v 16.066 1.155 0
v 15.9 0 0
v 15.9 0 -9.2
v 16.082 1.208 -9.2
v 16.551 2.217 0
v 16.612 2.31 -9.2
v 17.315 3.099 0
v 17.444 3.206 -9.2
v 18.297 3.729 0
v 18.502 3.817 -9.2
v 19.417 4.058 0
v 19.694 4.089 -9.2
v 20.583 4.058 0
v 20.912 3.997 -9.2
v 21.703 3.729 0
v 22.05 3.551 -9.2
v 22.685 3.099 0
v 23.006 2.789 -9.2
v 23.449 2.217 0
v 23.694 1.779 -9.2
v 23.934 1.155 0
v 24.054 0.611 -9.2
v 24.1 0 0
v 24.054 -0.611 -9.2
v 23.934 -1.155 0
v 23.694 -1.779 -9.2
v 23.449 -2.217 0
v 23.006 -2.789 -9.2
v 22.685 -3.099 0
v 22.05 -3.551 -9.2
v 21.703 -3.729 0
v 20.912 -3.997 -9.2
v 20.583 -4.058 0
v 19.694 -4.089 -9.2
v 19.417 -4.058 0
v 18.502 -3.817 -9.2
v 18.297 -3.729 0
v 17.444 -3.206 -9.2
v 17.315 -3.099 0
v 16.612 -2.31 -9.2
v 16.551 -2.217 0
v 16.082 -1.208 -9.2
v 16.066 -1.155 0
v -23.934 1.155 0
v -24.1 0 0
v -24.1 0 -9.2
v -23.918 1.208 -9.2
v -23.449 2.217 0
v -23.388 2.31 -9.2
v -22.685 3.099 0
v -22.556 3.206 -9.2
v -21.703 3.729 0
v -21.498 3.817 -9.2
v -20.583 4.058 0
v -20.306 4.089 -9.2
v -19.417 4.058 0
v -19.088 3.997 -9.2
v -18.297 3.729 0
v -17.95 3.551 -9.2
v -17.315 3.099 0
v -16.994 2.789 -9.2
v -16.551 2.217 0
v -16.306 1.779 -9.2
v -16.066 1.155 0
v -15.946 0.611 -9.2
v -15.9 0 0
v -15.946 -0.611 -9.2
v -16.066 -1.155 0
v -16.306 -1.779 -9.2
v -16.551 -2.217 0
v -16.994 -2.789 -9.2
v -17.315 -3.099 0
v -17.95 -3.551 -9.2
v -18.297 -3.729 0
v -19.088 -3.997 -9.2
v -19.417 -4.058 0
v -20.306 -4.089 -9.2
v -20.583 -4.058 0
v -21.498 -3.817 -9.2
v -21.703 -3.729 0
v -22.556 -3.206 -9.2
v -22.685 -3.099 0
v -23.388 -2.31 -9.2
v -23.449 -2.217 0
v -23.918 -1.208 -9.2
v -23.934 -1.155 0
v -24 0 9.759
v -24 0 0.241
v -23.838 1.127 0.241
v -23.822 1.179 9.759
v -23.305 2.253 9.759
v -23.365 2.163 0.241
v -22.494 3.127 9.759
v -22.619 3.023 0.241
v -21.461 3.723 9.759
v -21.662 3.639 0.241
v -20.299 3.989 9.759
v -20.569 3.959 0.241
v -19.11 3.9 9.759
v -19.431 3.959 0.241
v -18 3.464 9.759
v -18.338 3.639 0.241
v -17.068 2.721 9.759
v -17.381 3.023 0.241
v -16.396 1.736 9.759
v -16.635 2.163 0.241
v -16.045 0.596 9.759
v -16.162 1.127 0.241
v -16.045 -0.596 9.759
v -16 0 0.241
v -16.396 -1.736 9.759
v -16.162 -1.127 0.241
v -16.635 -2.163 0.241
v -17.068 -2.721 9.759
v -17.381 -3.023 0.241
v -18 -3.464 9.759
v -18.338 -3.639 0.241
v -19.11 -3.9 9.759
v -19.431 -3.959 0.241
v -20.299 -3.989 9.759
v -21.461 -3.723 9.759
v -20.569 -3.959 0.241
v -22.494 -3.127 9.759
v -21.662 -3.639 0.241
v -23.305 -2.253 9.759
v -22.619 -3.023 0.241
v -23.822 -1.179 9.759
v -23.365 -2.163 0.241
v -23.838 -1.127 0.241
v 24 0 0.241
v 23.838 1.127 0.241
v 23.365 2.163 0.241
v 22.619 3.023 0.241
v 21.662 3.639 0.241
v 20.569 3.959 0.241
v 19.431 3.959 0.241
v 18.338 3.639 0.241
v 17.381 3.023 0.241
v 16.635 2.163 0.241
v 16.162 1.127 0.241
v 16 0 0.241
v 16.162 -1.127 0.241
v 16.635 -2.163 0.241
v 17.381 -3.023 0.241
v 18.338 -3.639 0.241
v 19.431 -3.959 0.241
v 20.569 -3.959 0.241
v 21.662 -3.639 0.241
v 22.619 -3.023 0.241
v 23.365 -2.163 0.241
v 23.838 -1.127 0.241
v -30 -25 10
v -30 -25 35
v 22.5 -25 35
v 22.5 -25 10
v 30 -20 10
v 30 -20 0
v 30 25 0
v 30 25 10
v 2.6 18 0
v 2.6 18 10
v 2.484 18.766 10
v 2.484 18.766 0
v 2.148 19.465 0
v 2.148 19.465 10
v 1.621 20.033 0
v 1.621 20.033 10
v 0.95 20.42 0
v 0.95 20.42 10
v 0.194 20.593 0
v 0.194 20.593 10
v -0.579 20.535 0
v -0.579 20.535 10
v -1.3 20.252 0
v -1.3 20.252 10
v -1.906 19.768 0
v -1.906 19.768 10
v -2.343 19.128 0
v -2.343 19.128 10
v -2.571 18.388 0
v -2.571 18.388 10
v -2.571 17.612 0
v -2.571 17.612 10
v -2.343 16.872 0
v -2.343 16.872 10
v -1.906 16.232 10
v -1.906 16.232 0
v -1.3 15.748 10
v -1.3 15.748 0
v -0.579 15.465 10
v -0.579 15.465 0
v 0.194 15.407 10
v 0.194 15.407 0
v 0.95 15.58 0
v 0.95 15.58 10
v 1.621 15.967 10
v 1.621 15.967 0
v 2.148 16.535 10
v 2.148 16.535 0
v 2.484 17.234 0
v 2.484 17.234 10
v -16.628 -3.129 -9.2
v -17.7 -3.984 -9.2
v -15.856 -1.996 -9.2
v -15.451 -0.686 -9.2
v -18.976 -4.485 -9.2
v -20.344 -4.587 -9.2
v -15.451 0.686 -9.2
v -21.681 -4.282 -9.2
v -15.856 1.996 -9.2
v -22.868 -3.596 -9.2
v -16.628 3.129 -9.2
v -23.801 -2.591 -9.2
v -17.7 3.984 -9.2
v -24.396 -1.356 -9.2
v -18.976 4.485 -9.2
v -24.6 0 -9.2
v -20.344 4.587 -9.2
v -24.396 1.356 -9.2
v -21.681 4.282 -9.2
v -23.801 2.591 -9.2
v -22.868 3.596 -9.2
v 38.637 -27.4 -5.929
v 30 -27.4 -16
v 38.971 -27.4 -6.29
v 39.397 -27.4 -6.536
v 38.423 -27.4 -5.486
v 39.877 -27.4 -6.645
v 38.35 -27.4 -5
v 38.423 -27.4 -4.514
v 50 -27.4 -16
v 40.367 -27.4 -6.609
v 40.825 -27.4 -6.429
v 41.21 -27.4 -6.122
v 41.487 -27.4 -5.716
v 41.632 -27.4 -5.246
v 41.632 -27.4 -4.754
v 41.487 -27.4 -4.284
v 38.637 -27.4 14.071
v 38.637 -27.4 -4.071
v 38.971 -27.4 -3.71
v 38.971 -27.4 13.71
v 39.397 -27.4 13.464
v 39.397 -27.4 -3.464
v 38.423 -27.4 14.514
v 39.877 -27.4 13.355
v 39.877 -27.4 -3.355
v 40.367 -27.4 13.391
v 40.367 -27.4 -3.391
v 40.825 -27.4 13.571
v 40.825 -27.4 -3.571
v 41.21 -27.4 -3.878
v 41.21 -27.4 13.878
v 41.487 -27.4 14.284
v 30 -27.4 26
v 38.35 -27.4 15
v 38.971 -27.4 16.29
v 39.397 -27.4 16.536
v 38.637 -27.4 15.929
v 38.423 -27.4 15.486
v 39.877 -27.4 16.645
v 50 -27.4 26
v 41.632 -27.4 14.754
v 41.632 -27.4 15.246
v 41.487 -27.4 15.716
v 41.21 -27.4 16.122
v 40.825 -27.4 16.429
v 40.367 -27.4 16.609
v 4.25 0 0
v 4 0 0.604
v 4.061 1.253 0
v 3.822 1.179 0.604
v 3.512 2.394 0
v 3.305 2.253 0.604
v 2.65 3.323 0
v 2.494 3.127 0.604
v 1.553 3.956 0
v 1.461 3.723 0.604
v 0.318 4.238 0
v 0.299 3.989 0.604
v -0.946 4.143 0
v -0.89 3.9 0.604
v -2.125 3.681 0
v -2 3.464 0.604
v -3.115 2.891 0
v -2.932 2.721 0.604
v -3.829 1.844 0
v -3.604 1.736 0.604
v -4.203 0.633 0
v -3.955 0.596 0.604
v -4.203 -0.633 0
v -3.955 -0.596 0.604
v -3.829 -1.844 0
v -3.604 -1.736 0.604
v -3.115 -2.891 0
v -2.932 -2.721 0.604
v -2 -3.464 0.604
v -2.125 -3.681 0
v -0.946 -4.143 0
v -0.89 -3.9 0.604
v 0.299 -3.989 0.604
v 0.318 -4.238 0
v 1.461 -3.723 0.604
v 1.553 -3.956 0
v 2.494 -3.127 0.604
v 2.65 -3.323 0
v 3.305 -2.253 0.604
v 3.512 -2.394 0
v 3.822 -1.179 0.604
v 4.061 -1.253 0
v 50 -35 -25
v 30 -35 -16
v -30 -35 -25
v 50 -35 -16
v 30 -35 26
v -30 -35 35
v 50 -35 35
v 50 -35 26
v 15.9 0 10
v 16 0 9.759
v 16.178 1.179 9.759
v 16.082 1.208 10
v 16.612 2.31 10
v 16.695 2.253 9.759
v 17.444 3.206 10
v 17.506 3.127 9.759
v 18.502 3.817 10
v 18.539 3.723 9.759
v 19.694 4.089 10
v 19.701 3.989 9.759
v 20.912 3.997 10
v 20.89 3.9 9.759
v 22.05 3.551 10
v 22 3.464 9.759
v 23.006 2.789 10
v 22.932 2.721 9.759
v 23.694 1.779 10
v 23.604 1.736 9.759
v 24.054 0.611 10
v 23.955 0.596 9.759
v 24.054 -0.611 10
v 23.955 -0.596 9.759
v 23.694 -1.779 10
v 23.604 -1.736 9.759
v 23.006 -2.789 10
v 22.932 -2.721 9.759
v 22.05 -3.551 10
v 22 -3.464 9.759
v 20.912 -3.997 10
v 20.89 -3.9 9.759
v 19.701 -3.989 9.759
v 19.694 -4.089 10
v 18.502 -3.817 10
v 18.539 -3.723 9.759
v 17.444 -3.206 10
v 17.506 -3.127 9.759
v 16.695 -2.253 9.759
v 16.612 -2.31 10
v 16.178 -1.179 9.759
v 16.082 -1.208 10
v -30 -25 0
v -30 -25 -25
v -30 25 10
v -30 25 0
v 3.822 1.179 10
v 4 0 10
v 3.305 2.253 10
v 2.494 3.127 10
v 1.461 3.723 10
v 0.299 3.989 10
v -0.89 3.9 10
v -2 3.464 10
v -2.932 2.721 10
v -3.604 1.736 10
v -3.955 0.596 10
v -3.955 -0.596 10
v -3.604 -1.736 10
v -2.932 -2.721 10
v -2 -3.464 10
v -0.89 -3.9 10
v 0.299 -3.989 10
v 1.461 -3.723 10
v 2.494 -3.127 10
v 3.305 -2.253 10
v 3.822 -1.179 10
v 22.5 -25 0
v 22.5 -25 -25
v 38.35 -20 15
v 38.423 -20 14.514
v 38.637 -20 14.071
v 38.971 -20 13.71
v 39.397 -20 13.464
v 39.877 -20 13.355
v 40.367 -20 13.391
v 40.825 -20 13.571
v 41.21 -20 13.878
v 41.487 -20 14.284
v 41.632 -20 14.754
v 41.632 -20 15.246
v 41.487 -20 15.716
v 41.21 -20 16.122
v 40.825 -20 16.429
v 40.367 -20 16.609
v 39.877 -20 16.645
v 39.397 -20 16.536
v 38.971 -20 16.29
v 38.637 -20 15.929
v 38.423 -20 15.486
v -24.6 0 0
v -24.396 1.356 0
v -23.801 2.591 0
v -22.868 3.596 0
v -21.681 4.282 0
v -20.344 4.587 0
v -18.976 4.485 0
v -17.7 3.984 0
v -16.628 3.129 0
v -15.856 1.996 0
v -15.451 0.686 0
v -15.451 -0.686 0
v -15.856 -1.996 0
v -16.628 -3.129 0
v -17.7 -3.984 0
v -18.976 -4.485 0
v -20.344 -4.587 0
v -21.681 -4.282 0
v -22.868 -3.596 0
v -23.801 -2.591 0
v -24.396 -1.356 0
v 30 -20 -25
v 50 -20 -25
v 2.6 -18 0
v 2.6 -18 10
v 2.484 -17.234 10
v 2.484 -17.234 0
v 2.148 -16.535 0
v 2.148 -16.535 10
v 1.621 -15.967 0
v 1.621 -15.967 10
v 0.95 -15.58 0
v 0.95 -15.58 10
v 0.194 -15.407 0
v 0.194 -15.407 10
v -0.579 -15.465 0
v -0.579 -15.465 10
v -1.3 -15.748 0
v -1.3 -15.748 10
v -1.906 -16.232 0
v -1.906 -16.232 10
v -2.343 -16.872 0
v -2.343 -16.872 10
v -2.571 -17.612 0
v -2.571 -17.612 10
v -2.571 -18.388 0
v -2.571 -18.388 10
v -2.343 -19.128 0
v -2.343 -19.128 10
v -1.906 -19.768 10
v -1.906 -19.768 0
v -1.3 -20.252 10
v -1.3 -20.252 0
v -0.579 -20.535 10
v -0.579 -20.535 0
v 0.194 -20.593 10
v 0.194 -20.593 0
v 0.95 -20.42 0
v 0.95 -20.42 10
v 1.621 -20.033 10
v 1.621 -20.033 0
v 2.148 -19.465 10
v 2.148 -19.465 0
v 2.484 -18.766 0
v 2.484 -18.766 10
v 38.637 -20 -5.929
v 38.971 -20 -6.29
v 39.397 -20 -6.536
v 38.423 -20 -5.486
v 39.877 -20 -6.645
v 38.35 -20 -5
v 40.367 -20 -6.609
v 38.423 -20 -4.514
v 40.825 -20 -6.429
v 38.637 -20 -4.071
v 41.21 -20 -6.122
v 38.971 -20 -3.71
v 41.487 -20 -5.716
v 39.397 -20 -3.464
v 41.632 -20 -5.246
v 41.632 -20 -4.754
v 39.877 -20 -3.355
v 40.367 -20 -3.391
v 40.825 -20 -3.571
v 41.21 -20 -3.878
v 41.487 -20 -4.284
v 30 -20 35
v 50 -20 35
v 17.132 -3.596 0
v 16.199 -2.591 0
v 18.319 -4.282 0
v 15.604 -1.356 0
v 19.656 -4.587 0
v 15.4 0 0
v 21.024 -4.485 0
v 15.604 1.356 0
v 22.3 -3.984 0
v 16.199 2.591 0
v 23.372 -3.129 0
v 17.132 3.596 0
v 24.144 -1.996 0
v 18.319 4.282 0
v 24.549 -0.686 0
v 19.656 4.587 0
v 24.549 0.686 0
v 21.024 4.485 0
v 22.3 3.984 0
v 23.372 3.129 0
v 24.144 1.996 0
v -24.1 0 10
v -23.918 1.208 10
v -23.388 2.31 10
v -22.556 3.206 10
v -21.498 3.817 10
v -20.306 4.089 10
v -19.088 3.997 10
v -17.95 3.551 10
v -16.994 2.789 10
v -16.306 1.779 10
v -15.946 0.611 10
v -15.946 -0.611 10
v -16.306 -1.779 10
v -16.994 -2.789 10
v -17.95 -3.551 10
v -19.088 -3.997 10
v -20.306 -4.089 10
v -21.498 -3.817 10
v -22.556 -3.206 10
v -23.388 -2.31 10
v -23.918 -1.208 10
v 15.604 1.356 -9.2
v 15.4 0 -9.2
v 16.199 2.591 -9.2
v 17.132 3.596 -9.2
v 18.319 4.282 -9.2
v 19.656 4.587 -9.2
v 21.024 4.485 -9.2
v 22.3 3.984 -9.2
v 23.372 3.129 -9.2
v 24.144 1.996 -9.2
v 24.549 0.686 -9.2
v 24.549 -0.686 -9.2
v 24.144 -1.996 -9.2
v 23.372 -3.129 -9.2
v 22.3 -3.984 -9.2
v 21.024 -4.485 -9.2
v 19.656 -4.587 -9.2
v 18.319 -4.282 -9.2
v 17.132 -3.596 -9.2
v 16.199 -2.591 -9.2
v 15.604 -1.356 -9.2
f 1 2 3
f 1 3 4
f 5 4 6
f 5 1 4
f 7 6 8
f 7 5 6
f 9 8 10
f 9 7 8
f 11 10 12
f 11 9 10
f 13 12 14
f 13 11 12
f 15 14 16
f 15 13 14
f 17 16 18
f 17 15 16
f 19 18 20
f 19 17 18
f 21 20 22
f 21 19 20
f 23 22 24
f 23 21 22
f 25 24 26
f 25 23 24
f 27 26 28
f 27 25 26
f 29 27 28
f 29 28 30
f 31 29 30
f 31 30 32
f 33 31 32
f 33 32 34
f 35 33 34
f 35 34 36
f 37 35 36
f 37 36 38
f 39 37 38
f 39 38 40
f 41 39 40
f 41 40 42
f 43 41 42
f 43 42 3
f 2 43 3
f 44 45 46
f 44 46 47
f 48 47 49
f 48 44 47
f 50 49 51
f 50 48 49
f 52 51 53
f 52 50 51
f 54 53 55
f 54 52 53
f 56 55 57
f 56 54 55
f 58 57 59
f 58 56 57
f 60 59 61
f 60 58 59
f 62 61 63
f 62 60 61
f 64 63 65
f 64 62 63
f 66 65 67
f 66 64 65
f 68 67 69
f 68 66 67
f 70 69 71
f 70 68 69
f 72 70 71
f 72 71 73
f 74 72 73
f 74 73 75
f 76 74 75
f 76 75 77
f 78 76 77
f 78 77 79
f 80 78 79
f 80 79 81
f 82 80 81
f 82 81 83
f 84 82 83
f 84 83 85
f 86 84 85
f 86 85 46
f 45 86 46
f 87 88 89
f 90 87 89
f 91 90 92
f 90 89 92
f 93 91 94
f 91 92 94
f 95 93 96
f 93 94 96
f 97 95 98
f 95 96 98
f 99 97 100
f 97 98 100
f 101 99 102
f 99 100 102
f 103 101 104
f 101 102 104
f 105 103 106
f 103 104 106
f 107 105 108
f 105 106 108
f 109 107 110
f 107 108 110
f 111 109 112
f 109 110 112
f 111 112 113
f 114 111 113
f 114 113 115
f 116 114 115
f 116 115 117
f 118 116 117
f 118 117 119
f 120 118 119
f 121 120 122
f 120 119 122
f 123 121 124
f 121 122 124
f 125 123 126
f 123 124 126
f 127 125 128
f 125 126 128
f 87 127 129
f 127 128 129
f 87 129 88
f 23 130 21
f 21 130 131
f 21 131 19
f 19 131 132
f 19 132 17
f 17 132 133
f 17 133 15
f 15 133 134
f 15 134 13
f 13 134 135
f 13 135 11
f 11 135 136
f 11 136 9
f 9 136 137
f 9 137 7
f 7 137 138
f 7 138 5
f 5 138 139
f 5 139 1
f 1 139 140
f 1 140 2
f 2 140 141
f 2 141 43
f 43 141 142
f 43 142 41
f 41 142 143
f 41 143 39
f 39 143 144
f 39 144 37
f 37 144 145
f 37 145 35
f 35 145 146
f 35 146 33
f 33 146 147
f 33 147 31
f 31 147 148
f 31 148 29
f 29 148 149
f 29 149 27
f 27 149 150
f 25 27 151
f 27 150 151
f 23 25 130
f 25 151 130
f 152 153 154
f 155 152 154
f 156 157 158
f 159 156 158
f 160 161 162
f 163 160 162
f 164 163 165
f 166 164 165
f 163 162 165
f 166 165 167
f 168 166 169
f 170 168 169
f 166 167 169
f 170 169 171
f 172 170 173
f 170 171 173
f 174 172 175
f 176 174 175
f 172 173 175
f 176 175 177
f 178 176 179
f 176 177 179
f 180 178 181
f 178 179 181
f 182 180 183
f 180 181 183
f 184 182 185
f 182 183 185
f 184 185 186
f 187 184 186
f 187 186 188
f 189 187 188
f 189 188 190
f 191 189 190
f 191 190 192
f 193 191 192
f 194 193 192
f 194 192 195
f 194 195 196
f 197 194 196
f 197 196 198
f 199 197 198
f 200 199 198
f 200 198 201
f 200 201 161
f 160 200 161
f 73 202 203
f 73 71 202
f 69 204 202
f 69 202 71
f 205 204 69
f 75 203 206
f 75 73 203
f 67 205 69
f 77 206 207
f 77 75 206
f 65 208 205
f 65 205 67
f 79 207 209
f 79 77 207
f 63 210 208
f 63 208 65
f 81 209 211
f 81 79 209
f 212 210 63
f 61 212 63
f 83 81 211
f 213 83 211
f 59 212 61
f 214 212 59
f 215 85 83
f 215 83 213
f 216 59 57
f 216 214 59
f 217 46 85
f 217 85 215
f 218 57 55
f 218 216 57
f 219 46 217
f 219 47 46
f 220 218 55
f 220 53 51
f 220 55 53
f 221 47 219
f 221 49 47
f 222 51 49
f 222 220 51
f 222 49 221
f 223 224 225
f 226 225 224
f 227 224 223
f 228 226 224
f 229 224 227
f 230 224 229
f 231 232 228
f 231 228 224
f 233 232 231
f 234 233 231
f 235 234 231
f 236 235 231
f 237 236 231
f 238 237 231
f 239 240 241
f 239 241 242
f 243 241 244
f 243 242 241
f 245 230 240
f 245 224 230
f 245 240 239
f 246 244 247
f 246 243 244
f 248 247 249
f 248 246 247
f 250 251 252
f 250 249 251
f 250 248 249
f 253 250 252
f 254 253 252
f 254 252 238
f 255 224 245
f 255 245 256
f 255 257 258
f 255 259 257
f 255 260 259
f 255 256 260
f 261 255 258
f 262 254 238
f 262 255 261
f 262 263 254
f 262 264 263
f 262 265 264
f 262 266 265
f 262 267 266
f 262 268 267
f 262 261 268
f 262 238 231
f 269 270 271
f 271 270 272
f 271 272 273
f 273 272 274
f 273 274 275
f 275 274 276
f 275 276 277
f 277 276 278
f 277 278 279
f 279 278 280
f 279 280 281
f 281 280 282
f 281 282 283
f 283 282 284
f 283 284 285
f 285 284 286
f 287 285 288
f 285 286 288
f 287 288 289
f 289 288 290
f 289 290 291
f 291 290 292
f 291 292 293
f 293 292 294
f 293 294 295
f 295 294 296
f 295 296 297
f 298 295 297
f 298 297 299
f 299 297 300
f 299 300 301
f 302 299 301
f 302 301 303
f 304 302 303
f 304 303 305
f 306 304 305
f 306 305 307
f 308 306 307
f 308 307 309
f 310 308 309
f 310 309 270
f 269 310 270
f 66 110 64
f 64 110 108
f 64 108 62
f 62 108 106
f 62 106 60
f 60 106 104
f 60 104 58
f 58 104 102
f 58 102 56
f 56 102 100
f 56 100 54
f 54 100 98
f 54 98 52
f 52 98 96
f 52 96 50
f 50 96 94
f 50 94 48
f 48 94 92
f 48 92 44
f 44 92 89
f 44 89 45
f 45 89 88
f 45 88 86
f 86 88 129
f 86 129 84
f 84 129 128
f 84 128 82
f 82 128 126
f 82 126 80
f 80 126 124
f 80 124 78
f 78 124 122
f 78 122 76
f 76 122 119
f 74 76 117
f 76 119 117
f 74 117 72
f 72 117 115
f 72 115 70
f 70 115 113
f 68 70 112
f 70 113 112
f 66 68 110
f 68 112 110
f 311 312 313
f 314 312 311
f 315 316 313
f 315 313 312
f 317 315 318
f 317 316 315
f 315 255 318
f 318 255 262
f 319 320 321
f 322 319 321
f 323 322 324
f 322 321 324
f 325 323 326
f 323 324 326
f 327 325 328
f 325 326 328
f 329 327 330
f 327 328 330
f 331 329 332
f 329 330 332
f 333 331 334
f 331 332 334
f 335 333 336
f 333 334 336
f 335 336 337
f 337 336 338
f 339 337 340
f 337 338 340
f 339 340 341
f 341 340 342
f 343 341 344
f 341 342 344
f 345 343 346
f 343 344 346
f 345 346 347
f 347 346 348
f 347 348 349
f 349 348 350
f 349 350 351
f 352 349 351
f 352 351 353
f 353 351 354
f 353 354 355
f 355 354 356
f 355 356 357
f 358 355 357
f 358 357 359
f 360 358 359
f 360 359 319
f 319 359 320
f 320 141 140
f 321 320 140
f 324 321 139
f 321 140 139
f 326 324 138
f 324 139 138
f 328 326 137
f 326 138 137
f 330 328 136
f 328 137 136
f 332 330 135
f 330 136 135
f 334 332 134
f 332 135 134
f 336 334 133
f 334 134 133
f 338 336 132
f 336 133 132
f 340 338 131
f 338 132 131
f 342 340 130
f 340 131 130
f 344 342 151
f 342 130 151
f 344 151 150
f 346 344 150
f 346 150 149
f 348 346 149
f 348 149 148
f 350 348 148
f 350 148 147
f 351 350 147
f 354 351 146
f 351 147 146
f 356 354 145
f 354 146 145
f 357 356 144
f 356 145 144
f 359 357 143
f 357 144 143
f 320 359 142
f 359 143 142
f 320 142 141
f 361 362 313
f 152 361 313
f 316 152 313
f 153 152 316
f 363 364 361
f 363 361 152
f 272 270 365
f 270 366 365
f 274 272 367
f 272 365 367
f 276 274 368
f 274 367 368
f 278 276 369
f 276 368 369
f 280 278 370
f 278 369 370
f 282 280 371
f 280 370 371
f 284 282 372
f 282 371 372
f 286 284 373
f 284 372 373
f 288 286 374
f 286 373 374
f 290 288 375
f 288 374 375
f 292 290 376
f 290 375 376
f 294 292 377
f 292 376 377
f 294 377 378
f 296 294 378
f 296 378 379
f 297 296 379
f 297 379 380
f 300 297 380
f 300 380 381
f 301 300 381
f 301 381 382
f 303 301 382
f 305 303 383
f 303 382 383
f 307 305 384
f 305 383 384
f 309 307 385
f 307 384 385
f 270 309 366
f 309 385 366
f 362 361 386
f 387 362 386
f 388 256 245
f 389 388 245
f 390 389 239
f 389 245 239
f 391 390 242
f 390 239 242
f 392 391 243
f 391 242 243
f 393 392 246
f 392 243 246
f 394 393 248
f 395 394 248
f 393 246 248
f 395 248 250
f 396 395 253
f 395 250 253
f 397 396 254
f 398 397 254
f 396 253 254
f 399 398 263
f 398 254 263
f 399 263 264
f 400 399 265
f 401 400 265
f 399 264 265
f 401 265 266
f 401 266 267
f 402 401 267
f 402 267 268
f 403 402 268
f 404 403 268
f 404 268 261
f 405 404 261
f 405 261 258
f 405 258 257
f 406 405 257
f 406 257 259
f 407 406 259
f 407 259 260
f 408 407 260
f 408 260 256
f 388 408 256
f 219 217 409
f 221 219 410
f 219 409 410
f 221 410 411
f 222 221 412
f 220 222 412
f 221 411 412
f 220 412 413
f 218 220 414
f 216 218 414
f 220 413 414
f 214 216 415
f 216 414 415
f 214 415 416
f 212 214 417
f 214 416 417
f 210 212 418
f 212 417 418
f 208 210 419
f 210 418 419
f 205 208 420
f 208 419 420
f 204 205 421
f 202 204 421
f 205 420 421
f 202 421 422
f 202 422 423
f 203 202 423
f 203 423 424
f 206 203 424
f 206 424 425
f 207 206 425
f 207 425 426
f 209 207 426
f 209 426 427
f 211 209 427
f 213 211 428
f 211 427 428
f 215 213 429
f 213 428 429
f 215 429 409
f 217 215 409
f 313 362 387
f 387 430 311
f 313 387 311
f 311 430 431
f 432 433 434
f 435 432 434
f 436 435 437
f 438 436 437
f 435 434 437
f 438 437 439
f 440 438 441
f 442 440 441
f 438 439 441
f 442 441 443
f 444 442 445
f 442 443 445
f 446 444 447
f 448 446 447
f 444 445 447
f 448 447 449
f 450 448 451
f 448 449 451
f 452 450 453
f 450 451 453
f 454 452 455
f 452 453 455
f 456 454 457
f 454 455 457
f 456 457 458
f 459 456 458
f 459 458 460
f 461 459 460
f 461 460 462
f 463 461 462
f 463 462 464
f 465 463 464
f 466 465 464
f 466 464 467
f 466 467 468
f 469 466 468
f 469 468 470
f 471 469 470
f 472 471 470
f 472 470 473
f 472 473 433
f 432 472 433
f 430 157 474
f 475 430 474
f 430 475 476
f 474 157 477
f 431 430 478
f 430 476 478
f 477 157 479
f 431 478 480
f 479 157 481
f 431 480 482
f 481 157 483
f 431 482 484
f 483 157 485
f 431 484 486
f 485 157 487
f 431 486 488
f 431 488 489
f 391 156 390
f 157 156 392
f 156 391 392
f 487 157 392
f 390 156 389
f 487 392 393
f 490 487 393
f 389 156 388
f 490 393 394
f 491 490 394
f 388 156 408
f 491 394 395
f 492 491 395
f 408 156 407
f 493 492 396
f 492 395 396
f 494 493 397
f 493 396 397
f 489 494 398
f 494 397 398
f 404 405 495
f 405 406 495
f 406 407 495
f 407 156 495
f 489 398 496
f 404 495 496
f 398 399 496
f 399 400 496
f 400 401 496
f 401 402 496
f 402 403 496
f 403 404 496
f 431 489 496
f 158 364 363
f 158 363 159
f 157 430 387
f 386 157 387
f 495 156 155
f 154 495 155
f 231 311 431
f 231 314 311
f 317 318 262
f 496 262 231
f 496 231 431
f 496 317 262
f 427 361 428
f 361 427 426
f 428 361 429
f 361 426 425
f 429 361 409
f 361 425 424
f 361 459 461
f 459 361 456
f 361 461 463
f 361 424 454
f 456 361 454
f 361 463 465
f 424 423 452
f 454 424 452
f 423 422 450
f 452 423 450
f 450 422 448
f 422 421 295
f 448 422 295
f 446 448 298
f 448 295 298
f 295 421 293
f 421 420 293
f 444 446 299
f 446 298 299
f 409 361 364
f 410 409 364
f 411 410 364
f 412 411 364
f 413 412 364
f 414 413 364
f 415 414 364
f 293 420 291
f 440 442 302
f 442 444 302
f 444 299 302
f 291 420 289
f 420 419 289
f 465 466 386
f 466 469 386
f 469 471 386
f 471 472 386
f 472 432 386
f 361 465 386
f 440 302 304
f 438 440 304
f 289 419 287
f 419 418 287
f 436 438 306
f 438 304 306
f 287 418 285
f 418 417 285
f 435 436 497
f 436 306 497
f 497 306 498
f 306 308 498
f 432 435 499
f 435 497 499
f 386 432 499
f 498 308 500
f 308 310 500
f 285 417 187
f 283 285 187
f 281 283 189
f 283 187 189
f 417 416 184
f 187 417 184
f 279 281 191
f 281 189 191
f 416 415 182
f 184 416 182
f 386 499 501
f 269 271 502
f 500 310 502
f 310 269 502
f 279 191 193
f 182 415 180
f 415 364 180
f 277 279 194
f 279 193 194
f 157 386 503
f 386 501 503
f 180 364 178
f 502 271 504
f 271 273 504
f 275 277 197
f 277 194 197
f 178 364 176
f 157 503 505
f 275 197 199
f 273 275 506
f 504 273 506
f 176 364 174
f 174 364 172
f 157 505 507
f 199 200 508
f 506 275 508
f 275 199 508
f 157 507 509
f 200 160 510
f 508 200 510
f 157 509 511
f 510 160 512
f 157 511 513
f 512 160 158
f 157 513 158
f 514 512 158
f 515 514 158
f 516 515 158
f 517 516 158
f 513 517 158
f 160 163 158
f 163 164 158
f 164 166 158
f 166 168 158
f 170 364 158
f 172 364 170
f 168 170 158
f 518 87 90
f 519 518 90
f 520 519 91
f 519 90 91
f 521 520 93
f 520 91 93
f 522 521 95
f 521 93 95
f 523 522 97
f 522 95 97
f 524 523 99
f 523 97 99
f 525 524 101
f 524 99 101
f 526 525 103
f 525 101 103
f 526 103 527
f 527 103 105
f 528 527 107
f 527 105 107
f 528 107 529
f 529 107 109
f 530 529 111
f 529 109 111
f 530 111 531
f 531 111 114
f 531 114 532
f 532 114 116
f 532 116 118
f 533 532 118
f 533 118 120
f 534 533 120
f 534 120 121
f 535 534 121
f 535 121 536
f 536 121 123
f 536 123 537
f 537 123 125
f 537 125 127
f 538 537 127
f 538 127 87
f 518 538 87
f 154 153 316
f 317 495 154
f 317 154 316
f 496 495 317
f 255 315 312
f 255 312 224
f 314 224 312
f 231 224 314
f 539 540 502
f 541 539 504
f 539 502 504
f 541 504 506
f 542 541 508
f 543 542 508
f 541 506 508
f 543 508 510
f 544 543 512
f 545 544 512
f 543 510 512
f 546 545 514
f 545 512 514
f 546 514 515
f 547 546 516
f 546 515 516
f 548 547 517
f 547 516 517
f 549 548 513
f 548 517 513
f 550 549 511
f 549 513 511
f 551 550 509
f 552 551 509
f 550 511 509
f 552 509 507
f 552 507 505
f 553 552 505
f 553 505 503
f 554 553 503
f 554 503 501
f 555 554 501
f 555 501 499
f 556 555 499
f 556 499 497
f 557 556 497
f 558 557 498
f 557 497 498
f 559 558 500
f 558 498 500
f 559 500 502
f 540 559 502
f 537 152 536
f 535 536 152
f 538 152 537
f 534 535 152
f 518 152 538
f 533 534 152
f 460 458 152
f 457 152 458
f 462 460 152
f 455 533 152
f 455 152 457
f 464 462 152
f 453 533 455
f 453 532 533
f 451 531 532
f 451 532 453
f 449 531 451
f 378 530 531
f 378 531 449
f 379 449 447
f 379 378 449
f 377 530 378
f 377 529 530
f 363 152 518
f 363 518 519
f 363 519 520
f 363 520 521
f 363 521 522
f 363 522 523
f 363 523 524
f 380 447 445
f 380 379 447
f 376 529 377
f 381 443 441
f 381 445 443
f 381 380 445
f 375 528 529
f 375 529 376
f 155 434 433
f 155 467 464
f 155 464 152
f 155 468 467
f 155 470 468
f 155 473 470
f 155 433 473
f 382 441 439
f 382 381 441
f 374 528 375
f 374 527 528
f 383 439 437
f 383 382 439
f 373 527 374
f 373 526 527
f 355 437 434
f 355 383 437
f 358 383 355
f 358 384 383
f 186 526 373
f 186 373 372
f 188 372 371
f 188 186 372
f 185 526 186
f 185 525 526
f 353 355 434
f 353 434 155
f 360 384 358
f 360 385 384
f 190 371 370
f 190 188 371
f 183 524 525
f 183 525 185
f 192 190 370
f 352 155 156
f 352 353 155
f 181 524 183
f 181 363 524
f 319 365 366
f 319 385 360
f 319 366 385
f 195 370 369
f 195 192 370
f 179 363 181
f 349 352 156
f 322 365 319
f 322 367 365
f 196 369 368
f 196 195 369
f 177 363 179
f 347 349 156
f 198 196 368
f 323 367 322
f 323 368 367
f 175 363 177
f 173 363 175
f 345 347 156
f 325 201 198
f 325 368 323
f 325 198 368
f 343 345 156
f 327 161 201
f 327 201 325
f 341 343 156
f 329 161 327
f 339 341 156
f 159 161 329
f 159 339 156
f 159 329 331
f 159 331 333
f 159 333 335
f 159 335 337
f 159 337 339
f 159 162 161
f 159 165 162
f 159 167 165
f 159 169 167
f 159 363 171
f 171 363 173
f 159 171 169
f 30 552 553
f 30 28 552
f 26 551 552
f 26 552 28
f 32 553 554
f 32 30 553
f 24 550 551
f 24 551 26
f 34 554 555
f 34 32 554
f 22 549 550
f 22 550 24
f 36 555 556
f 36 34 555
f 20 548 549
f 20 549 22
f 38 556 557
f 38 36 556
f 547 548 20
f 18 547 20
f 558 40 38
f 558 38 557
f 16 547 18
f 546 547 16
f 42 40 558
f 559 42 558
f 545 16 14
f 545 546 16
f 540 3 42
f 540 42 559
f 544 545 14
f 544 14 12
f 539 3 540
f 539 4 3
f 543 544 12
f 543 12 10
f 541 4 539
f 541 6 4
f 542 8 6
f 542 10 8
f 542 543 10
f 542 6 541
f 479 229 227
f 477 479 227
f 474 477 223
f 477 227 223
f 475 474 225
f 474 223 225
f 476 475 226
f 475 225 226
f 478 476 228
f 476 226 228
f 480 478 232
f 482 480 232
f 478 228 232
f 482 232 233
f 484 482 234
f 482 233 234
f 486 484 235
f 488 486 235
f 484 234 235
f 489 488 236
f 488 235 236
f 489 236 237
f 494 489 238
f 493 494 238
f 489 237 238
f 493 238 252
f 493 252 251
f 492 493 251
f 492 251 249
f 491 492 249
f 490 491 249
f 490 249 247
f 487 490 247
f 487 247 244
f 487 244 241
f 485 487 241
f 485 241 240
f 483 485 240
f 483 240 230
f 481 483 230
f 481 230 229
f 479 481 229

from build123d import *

# Parameters (mm, degrees)
SKETCH_1_W                = 60
SKETCH_1_H                = 50
EXTRUDE_1_DEPTH           = 10
HOLE_WIZARD_2_D           = 8
HOLE_WIZARD_2_CSINK_D     = 8.2
HOLE_WIZARD_2_CSINK_ANGLE = 45
HOLE_WIZARD_3_D           = 5.2
SKETCH_8_W                = 80
SKETCH_8_H                = 60
EXTRUDE_2_DEPTH           = 10
SKETCH_11_W               = 20
SKETCH_11_H               = 7.6
CUT_EXTRUDE_1_DEPTH       = 21
SKETCH_12_W               = 20
SKETCH_12_H               = 5
EXTRUDE_4_DEPTH           = 30
HOLE_WIZARD_4_D           = 3.3
EXTRUDE_START             = -60
EXTRUDE_5_DEPTH           = 60
HOLE_WIZARD_5_D           = 8
HOLE_WIZARD_5_CSINK_D     = 8.5
HOLE_WIZARD_5_CSINK_ANGLE = 45
HOLE_WIZARD_6_D           = 8
HOLE_WIZARD_6_CSINK_D     = 8.2
HOLE_WIZARD_6_CSINK_ANGLE = 45
SKETCH_22_R               = 4.6
SKETCH_22_R_2             = 4.1
EXTRUDE_7_DEPTH           = 9.2


with BuildPart() as part:
    # 草图1 → 凸台-拉伸1 (new body)
    with BuildSketch(Plane.XY):
        Rectangle(SKETCH_1_W, SKETCH_1_H)
    extrude(amount=EXTRUDE_1_DEPTH)

    # 孔2 (through all)
    with Locations(Plane.XY.offset(10)):
        with Locations((20, 0), (-20, 0)):
            CounterSinkHole(HOLE_WIZARD_2_D / 2, HOLE_WIZARD_2_CSINK_D / 2, counter_sink_angle=HOLE_WIZARD_2_CSINK_ANGLE)

    # 孔3 (through all)
    with Locations(Plane(origin=(0, 0, 0), x_dir=(-1, 0, 0), z_dir=(0, 0, -1))):
        with Locations((0, 18), (0, -18)):
            Hole(HOLE_WIZARD_3_D / 2)

    # 草图8 → 凸台-拉伸2 (add)
    with BuildSketch(Plane.XZ.offset(25)):
        with Locations((10, 5)):
            Rectangle(SKETCH_8_W, SKETCH_8_H)
    extrude(amount=EXTRUDE_2_DEPTH)

    # 草图11 → 切除-拉伸1 (cut, symmetric)
    with BuildSketch(Plane.XY.offset(5)):
        with Locations((40, -31.2)):
            Rectangle(SKETCH_11_W, SKETCH_11_H)
    extrude(amount=CUT_EXTRUDE_1_DEPTH, both=True, mode=Mode.SUBTRACT)

    # 草图12 → 凸台-拉伸4 (add, symmetric)
    with BuildSketch(Plane.XY.offset(5)):
        with Locations((40, -22.5)):
            Rectangle(SKETCH_12_W, SKETCH_12_H)
    extrude(amount=EXTRUDE_4_DEPTH, both=True)

    # 孔4 (through all)
    with Locations(Plane(origin=(0, -20, 0), x_dir=(1, 0, 0), z_dir=(0, 1, 0))):
        with Locations((40, -15), (40, 5)):
            Hole(HOLE_WIZARD_4_D / 2)

    # 草图15 → 凸台-拉伸5 (add)
    with BuildSketch(Plane.XY.offset(35).offset(EXTRUDE_START)):
        Polygon((30, -20), (22.5, -25), (30, -25), align=None)
    extrude(amount=EXTRUDE_5_DEPTH)

    # 孔5 (through all)
    with Locations(Plane(origin=(0, 0, 0), x_dir=(-1, 0, 0), z_dir=(0, 0, -1))):
        with Locations((0, 0)):
            CounterSinkHole(HOLE_WIZARD_5_D / 2, HOLE_WIZARD_5_CSINK_D / 2, counter_sink_angle=HOLE_WIZARD_5_CSINK_ANGLE)

    # 孔6 (through all)
    with Locations(Plane(origin=(0, 0, 0), x_dir=(-1, 0, 0), z_dir=(0, 0, -1))):
        with Locations((-20, 0), (20, 0)):
            CounterSinkHole(HOLE_WIZARD_6_D / 2, HOLE_WIZARD_6_CSINK_D / 2, counter_sink_angle=HOLE_WIZARD_6_CSINK_ANGLE)

    # 草图22 → 凸台-拉伸7 (add)
    # profile 1 of 2: a face of its own
    with BuildSketch(Plane(origin=(0, 0, 0), x_dir=(-1, 0, 0), z_dir=(0, 0, -1))):
        with Locations((-20, 0)):
            Circle(SKETCH_22_R)
        with Locations((-20, 0)):
            Circle(SKETCH_22_R_2, mode=Mode.SUBTRACT)
    # profile 2 of 2: a face of its own
    with BuildSketch(Plane(origin=(0, 0, 0), x_dir=(-1, 0, 0), z_dir=(0, 0, -1))):
        with Locations((20, 0)):
            Circle(SKETCH_22_R)
        with Locations((20, 0)):
            Circle(SKETCH_22_R_2, mode=Mode.SUBTRACT)
    extrude(amount=EXTRUDE_7_DEPTH)


solid = part.part
